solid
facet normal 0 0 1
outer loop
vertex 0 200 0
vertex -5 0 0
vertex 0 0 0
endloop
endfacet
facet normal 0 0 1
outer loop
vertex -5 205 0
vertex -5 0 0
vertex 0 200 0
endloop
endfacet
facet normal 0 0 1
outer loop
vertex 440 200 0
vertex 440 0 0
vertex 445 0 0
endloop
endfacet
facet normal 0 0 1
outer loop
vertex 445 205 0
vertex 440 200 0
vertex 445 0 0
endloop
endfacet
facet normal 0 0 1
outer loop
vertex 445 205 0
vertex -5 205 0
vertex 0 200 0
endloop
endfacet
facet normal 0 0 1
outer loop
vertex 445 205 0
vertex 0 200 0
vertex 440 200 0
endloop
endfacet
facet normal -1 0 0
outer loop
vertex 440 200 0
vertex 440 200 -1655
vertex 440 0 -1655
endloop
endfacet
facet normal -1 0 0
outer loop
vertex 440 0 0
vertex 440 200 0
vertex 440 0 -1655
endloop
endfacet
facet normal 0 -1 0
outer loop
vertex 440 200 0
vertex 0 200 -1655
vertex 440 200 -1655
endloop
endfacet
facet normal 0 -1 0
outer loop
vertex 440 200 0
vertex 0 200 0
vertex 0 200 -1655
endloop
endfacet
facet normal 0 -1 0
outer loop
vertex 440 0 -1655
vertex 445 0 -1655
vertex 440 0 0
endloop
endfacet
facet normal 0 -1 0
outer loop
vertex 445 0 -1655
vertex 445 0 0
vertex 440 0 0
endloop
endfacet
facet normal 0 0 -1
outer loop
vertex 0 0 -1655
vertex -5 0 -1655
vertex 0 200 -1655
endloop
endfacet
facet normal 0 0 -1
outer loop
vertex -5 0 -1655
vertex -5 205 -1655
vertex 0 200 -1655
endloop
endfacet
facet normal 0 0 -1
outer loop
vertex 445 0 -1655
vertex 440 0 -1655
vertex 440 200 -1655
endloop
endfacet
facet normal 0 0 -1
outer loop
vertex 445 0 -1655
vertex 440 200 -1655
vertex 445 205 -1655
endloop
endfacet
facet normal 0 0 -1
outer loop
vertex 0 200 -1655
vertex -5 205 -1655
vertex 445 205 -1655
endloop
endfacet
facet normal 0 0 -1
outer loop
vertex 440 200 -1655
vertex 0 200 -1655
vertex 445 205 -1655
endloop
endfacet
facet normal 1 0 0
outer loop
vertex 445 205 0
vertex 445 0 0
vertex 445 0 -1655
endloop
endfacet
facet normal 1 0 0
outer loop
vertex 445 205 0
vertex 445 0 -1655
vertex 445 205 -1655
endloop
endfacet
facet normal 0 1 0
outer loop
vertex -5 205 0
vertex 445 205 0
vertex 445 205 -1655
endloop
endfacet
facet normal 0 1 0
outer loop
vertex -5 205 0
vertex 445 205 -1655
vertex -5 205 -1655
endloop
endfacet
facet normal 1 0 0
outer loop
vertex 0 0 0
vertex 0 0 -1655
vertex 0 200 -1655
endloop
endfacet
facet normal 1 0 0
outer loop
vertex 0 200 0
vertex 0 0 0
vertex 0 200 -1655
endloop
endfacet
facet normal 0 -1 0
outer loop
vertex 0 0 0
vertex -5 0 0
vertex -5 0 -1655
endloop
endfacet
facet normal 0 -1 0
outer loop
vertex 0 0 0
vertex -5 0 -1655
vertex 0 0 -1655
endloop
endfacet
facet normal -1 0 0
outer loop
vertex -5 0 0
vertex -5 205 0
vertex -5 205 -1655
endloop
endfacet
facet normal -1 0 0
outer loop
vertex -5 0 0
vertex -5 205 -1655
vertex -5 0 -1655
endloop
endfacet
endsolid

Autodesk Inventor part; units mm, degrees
ref_plane "YZ Plane" through (0, 0, 0) normal (1, 0, 0) x (0, 1, 0)
ref_plane "XZ Plane" through (0, 0, 0) normal (0, 1, 0) x (-1, 0, 0)
ref_plane "XY Plane" through (0, 0, 0) normal (0, 0, 1) x (1, 0, 0)
sketch "Sketch1" plane through (0, 0, 0) normal (0, 0, 1) x (1, 0, 0)
  line L0 (0, 0) -> (0, 200)
  line L1 (0, 200) -> (440, 200)
  line L2 (440, 200) -> (440, 0)
  line L3 (445, 0) -> (445, 205)
  line L4 (445, 205) -> (-5, 205)
  line L5 (-5, 205) -> (-5, 0)
  line L6 (-5, 0) -> (0, 0)
  line L7 (445, 0) -> (440, 0)
  dimension "d1" = 440
  dimension "d4" = 200
  dimension "d5" = 440
  dimension "d6" = 5
extrude "Extrusion1" add sketch "Sketch1" against normal blind 1655
properties part number "Proteção" material "Polycarbonate, Clear"
